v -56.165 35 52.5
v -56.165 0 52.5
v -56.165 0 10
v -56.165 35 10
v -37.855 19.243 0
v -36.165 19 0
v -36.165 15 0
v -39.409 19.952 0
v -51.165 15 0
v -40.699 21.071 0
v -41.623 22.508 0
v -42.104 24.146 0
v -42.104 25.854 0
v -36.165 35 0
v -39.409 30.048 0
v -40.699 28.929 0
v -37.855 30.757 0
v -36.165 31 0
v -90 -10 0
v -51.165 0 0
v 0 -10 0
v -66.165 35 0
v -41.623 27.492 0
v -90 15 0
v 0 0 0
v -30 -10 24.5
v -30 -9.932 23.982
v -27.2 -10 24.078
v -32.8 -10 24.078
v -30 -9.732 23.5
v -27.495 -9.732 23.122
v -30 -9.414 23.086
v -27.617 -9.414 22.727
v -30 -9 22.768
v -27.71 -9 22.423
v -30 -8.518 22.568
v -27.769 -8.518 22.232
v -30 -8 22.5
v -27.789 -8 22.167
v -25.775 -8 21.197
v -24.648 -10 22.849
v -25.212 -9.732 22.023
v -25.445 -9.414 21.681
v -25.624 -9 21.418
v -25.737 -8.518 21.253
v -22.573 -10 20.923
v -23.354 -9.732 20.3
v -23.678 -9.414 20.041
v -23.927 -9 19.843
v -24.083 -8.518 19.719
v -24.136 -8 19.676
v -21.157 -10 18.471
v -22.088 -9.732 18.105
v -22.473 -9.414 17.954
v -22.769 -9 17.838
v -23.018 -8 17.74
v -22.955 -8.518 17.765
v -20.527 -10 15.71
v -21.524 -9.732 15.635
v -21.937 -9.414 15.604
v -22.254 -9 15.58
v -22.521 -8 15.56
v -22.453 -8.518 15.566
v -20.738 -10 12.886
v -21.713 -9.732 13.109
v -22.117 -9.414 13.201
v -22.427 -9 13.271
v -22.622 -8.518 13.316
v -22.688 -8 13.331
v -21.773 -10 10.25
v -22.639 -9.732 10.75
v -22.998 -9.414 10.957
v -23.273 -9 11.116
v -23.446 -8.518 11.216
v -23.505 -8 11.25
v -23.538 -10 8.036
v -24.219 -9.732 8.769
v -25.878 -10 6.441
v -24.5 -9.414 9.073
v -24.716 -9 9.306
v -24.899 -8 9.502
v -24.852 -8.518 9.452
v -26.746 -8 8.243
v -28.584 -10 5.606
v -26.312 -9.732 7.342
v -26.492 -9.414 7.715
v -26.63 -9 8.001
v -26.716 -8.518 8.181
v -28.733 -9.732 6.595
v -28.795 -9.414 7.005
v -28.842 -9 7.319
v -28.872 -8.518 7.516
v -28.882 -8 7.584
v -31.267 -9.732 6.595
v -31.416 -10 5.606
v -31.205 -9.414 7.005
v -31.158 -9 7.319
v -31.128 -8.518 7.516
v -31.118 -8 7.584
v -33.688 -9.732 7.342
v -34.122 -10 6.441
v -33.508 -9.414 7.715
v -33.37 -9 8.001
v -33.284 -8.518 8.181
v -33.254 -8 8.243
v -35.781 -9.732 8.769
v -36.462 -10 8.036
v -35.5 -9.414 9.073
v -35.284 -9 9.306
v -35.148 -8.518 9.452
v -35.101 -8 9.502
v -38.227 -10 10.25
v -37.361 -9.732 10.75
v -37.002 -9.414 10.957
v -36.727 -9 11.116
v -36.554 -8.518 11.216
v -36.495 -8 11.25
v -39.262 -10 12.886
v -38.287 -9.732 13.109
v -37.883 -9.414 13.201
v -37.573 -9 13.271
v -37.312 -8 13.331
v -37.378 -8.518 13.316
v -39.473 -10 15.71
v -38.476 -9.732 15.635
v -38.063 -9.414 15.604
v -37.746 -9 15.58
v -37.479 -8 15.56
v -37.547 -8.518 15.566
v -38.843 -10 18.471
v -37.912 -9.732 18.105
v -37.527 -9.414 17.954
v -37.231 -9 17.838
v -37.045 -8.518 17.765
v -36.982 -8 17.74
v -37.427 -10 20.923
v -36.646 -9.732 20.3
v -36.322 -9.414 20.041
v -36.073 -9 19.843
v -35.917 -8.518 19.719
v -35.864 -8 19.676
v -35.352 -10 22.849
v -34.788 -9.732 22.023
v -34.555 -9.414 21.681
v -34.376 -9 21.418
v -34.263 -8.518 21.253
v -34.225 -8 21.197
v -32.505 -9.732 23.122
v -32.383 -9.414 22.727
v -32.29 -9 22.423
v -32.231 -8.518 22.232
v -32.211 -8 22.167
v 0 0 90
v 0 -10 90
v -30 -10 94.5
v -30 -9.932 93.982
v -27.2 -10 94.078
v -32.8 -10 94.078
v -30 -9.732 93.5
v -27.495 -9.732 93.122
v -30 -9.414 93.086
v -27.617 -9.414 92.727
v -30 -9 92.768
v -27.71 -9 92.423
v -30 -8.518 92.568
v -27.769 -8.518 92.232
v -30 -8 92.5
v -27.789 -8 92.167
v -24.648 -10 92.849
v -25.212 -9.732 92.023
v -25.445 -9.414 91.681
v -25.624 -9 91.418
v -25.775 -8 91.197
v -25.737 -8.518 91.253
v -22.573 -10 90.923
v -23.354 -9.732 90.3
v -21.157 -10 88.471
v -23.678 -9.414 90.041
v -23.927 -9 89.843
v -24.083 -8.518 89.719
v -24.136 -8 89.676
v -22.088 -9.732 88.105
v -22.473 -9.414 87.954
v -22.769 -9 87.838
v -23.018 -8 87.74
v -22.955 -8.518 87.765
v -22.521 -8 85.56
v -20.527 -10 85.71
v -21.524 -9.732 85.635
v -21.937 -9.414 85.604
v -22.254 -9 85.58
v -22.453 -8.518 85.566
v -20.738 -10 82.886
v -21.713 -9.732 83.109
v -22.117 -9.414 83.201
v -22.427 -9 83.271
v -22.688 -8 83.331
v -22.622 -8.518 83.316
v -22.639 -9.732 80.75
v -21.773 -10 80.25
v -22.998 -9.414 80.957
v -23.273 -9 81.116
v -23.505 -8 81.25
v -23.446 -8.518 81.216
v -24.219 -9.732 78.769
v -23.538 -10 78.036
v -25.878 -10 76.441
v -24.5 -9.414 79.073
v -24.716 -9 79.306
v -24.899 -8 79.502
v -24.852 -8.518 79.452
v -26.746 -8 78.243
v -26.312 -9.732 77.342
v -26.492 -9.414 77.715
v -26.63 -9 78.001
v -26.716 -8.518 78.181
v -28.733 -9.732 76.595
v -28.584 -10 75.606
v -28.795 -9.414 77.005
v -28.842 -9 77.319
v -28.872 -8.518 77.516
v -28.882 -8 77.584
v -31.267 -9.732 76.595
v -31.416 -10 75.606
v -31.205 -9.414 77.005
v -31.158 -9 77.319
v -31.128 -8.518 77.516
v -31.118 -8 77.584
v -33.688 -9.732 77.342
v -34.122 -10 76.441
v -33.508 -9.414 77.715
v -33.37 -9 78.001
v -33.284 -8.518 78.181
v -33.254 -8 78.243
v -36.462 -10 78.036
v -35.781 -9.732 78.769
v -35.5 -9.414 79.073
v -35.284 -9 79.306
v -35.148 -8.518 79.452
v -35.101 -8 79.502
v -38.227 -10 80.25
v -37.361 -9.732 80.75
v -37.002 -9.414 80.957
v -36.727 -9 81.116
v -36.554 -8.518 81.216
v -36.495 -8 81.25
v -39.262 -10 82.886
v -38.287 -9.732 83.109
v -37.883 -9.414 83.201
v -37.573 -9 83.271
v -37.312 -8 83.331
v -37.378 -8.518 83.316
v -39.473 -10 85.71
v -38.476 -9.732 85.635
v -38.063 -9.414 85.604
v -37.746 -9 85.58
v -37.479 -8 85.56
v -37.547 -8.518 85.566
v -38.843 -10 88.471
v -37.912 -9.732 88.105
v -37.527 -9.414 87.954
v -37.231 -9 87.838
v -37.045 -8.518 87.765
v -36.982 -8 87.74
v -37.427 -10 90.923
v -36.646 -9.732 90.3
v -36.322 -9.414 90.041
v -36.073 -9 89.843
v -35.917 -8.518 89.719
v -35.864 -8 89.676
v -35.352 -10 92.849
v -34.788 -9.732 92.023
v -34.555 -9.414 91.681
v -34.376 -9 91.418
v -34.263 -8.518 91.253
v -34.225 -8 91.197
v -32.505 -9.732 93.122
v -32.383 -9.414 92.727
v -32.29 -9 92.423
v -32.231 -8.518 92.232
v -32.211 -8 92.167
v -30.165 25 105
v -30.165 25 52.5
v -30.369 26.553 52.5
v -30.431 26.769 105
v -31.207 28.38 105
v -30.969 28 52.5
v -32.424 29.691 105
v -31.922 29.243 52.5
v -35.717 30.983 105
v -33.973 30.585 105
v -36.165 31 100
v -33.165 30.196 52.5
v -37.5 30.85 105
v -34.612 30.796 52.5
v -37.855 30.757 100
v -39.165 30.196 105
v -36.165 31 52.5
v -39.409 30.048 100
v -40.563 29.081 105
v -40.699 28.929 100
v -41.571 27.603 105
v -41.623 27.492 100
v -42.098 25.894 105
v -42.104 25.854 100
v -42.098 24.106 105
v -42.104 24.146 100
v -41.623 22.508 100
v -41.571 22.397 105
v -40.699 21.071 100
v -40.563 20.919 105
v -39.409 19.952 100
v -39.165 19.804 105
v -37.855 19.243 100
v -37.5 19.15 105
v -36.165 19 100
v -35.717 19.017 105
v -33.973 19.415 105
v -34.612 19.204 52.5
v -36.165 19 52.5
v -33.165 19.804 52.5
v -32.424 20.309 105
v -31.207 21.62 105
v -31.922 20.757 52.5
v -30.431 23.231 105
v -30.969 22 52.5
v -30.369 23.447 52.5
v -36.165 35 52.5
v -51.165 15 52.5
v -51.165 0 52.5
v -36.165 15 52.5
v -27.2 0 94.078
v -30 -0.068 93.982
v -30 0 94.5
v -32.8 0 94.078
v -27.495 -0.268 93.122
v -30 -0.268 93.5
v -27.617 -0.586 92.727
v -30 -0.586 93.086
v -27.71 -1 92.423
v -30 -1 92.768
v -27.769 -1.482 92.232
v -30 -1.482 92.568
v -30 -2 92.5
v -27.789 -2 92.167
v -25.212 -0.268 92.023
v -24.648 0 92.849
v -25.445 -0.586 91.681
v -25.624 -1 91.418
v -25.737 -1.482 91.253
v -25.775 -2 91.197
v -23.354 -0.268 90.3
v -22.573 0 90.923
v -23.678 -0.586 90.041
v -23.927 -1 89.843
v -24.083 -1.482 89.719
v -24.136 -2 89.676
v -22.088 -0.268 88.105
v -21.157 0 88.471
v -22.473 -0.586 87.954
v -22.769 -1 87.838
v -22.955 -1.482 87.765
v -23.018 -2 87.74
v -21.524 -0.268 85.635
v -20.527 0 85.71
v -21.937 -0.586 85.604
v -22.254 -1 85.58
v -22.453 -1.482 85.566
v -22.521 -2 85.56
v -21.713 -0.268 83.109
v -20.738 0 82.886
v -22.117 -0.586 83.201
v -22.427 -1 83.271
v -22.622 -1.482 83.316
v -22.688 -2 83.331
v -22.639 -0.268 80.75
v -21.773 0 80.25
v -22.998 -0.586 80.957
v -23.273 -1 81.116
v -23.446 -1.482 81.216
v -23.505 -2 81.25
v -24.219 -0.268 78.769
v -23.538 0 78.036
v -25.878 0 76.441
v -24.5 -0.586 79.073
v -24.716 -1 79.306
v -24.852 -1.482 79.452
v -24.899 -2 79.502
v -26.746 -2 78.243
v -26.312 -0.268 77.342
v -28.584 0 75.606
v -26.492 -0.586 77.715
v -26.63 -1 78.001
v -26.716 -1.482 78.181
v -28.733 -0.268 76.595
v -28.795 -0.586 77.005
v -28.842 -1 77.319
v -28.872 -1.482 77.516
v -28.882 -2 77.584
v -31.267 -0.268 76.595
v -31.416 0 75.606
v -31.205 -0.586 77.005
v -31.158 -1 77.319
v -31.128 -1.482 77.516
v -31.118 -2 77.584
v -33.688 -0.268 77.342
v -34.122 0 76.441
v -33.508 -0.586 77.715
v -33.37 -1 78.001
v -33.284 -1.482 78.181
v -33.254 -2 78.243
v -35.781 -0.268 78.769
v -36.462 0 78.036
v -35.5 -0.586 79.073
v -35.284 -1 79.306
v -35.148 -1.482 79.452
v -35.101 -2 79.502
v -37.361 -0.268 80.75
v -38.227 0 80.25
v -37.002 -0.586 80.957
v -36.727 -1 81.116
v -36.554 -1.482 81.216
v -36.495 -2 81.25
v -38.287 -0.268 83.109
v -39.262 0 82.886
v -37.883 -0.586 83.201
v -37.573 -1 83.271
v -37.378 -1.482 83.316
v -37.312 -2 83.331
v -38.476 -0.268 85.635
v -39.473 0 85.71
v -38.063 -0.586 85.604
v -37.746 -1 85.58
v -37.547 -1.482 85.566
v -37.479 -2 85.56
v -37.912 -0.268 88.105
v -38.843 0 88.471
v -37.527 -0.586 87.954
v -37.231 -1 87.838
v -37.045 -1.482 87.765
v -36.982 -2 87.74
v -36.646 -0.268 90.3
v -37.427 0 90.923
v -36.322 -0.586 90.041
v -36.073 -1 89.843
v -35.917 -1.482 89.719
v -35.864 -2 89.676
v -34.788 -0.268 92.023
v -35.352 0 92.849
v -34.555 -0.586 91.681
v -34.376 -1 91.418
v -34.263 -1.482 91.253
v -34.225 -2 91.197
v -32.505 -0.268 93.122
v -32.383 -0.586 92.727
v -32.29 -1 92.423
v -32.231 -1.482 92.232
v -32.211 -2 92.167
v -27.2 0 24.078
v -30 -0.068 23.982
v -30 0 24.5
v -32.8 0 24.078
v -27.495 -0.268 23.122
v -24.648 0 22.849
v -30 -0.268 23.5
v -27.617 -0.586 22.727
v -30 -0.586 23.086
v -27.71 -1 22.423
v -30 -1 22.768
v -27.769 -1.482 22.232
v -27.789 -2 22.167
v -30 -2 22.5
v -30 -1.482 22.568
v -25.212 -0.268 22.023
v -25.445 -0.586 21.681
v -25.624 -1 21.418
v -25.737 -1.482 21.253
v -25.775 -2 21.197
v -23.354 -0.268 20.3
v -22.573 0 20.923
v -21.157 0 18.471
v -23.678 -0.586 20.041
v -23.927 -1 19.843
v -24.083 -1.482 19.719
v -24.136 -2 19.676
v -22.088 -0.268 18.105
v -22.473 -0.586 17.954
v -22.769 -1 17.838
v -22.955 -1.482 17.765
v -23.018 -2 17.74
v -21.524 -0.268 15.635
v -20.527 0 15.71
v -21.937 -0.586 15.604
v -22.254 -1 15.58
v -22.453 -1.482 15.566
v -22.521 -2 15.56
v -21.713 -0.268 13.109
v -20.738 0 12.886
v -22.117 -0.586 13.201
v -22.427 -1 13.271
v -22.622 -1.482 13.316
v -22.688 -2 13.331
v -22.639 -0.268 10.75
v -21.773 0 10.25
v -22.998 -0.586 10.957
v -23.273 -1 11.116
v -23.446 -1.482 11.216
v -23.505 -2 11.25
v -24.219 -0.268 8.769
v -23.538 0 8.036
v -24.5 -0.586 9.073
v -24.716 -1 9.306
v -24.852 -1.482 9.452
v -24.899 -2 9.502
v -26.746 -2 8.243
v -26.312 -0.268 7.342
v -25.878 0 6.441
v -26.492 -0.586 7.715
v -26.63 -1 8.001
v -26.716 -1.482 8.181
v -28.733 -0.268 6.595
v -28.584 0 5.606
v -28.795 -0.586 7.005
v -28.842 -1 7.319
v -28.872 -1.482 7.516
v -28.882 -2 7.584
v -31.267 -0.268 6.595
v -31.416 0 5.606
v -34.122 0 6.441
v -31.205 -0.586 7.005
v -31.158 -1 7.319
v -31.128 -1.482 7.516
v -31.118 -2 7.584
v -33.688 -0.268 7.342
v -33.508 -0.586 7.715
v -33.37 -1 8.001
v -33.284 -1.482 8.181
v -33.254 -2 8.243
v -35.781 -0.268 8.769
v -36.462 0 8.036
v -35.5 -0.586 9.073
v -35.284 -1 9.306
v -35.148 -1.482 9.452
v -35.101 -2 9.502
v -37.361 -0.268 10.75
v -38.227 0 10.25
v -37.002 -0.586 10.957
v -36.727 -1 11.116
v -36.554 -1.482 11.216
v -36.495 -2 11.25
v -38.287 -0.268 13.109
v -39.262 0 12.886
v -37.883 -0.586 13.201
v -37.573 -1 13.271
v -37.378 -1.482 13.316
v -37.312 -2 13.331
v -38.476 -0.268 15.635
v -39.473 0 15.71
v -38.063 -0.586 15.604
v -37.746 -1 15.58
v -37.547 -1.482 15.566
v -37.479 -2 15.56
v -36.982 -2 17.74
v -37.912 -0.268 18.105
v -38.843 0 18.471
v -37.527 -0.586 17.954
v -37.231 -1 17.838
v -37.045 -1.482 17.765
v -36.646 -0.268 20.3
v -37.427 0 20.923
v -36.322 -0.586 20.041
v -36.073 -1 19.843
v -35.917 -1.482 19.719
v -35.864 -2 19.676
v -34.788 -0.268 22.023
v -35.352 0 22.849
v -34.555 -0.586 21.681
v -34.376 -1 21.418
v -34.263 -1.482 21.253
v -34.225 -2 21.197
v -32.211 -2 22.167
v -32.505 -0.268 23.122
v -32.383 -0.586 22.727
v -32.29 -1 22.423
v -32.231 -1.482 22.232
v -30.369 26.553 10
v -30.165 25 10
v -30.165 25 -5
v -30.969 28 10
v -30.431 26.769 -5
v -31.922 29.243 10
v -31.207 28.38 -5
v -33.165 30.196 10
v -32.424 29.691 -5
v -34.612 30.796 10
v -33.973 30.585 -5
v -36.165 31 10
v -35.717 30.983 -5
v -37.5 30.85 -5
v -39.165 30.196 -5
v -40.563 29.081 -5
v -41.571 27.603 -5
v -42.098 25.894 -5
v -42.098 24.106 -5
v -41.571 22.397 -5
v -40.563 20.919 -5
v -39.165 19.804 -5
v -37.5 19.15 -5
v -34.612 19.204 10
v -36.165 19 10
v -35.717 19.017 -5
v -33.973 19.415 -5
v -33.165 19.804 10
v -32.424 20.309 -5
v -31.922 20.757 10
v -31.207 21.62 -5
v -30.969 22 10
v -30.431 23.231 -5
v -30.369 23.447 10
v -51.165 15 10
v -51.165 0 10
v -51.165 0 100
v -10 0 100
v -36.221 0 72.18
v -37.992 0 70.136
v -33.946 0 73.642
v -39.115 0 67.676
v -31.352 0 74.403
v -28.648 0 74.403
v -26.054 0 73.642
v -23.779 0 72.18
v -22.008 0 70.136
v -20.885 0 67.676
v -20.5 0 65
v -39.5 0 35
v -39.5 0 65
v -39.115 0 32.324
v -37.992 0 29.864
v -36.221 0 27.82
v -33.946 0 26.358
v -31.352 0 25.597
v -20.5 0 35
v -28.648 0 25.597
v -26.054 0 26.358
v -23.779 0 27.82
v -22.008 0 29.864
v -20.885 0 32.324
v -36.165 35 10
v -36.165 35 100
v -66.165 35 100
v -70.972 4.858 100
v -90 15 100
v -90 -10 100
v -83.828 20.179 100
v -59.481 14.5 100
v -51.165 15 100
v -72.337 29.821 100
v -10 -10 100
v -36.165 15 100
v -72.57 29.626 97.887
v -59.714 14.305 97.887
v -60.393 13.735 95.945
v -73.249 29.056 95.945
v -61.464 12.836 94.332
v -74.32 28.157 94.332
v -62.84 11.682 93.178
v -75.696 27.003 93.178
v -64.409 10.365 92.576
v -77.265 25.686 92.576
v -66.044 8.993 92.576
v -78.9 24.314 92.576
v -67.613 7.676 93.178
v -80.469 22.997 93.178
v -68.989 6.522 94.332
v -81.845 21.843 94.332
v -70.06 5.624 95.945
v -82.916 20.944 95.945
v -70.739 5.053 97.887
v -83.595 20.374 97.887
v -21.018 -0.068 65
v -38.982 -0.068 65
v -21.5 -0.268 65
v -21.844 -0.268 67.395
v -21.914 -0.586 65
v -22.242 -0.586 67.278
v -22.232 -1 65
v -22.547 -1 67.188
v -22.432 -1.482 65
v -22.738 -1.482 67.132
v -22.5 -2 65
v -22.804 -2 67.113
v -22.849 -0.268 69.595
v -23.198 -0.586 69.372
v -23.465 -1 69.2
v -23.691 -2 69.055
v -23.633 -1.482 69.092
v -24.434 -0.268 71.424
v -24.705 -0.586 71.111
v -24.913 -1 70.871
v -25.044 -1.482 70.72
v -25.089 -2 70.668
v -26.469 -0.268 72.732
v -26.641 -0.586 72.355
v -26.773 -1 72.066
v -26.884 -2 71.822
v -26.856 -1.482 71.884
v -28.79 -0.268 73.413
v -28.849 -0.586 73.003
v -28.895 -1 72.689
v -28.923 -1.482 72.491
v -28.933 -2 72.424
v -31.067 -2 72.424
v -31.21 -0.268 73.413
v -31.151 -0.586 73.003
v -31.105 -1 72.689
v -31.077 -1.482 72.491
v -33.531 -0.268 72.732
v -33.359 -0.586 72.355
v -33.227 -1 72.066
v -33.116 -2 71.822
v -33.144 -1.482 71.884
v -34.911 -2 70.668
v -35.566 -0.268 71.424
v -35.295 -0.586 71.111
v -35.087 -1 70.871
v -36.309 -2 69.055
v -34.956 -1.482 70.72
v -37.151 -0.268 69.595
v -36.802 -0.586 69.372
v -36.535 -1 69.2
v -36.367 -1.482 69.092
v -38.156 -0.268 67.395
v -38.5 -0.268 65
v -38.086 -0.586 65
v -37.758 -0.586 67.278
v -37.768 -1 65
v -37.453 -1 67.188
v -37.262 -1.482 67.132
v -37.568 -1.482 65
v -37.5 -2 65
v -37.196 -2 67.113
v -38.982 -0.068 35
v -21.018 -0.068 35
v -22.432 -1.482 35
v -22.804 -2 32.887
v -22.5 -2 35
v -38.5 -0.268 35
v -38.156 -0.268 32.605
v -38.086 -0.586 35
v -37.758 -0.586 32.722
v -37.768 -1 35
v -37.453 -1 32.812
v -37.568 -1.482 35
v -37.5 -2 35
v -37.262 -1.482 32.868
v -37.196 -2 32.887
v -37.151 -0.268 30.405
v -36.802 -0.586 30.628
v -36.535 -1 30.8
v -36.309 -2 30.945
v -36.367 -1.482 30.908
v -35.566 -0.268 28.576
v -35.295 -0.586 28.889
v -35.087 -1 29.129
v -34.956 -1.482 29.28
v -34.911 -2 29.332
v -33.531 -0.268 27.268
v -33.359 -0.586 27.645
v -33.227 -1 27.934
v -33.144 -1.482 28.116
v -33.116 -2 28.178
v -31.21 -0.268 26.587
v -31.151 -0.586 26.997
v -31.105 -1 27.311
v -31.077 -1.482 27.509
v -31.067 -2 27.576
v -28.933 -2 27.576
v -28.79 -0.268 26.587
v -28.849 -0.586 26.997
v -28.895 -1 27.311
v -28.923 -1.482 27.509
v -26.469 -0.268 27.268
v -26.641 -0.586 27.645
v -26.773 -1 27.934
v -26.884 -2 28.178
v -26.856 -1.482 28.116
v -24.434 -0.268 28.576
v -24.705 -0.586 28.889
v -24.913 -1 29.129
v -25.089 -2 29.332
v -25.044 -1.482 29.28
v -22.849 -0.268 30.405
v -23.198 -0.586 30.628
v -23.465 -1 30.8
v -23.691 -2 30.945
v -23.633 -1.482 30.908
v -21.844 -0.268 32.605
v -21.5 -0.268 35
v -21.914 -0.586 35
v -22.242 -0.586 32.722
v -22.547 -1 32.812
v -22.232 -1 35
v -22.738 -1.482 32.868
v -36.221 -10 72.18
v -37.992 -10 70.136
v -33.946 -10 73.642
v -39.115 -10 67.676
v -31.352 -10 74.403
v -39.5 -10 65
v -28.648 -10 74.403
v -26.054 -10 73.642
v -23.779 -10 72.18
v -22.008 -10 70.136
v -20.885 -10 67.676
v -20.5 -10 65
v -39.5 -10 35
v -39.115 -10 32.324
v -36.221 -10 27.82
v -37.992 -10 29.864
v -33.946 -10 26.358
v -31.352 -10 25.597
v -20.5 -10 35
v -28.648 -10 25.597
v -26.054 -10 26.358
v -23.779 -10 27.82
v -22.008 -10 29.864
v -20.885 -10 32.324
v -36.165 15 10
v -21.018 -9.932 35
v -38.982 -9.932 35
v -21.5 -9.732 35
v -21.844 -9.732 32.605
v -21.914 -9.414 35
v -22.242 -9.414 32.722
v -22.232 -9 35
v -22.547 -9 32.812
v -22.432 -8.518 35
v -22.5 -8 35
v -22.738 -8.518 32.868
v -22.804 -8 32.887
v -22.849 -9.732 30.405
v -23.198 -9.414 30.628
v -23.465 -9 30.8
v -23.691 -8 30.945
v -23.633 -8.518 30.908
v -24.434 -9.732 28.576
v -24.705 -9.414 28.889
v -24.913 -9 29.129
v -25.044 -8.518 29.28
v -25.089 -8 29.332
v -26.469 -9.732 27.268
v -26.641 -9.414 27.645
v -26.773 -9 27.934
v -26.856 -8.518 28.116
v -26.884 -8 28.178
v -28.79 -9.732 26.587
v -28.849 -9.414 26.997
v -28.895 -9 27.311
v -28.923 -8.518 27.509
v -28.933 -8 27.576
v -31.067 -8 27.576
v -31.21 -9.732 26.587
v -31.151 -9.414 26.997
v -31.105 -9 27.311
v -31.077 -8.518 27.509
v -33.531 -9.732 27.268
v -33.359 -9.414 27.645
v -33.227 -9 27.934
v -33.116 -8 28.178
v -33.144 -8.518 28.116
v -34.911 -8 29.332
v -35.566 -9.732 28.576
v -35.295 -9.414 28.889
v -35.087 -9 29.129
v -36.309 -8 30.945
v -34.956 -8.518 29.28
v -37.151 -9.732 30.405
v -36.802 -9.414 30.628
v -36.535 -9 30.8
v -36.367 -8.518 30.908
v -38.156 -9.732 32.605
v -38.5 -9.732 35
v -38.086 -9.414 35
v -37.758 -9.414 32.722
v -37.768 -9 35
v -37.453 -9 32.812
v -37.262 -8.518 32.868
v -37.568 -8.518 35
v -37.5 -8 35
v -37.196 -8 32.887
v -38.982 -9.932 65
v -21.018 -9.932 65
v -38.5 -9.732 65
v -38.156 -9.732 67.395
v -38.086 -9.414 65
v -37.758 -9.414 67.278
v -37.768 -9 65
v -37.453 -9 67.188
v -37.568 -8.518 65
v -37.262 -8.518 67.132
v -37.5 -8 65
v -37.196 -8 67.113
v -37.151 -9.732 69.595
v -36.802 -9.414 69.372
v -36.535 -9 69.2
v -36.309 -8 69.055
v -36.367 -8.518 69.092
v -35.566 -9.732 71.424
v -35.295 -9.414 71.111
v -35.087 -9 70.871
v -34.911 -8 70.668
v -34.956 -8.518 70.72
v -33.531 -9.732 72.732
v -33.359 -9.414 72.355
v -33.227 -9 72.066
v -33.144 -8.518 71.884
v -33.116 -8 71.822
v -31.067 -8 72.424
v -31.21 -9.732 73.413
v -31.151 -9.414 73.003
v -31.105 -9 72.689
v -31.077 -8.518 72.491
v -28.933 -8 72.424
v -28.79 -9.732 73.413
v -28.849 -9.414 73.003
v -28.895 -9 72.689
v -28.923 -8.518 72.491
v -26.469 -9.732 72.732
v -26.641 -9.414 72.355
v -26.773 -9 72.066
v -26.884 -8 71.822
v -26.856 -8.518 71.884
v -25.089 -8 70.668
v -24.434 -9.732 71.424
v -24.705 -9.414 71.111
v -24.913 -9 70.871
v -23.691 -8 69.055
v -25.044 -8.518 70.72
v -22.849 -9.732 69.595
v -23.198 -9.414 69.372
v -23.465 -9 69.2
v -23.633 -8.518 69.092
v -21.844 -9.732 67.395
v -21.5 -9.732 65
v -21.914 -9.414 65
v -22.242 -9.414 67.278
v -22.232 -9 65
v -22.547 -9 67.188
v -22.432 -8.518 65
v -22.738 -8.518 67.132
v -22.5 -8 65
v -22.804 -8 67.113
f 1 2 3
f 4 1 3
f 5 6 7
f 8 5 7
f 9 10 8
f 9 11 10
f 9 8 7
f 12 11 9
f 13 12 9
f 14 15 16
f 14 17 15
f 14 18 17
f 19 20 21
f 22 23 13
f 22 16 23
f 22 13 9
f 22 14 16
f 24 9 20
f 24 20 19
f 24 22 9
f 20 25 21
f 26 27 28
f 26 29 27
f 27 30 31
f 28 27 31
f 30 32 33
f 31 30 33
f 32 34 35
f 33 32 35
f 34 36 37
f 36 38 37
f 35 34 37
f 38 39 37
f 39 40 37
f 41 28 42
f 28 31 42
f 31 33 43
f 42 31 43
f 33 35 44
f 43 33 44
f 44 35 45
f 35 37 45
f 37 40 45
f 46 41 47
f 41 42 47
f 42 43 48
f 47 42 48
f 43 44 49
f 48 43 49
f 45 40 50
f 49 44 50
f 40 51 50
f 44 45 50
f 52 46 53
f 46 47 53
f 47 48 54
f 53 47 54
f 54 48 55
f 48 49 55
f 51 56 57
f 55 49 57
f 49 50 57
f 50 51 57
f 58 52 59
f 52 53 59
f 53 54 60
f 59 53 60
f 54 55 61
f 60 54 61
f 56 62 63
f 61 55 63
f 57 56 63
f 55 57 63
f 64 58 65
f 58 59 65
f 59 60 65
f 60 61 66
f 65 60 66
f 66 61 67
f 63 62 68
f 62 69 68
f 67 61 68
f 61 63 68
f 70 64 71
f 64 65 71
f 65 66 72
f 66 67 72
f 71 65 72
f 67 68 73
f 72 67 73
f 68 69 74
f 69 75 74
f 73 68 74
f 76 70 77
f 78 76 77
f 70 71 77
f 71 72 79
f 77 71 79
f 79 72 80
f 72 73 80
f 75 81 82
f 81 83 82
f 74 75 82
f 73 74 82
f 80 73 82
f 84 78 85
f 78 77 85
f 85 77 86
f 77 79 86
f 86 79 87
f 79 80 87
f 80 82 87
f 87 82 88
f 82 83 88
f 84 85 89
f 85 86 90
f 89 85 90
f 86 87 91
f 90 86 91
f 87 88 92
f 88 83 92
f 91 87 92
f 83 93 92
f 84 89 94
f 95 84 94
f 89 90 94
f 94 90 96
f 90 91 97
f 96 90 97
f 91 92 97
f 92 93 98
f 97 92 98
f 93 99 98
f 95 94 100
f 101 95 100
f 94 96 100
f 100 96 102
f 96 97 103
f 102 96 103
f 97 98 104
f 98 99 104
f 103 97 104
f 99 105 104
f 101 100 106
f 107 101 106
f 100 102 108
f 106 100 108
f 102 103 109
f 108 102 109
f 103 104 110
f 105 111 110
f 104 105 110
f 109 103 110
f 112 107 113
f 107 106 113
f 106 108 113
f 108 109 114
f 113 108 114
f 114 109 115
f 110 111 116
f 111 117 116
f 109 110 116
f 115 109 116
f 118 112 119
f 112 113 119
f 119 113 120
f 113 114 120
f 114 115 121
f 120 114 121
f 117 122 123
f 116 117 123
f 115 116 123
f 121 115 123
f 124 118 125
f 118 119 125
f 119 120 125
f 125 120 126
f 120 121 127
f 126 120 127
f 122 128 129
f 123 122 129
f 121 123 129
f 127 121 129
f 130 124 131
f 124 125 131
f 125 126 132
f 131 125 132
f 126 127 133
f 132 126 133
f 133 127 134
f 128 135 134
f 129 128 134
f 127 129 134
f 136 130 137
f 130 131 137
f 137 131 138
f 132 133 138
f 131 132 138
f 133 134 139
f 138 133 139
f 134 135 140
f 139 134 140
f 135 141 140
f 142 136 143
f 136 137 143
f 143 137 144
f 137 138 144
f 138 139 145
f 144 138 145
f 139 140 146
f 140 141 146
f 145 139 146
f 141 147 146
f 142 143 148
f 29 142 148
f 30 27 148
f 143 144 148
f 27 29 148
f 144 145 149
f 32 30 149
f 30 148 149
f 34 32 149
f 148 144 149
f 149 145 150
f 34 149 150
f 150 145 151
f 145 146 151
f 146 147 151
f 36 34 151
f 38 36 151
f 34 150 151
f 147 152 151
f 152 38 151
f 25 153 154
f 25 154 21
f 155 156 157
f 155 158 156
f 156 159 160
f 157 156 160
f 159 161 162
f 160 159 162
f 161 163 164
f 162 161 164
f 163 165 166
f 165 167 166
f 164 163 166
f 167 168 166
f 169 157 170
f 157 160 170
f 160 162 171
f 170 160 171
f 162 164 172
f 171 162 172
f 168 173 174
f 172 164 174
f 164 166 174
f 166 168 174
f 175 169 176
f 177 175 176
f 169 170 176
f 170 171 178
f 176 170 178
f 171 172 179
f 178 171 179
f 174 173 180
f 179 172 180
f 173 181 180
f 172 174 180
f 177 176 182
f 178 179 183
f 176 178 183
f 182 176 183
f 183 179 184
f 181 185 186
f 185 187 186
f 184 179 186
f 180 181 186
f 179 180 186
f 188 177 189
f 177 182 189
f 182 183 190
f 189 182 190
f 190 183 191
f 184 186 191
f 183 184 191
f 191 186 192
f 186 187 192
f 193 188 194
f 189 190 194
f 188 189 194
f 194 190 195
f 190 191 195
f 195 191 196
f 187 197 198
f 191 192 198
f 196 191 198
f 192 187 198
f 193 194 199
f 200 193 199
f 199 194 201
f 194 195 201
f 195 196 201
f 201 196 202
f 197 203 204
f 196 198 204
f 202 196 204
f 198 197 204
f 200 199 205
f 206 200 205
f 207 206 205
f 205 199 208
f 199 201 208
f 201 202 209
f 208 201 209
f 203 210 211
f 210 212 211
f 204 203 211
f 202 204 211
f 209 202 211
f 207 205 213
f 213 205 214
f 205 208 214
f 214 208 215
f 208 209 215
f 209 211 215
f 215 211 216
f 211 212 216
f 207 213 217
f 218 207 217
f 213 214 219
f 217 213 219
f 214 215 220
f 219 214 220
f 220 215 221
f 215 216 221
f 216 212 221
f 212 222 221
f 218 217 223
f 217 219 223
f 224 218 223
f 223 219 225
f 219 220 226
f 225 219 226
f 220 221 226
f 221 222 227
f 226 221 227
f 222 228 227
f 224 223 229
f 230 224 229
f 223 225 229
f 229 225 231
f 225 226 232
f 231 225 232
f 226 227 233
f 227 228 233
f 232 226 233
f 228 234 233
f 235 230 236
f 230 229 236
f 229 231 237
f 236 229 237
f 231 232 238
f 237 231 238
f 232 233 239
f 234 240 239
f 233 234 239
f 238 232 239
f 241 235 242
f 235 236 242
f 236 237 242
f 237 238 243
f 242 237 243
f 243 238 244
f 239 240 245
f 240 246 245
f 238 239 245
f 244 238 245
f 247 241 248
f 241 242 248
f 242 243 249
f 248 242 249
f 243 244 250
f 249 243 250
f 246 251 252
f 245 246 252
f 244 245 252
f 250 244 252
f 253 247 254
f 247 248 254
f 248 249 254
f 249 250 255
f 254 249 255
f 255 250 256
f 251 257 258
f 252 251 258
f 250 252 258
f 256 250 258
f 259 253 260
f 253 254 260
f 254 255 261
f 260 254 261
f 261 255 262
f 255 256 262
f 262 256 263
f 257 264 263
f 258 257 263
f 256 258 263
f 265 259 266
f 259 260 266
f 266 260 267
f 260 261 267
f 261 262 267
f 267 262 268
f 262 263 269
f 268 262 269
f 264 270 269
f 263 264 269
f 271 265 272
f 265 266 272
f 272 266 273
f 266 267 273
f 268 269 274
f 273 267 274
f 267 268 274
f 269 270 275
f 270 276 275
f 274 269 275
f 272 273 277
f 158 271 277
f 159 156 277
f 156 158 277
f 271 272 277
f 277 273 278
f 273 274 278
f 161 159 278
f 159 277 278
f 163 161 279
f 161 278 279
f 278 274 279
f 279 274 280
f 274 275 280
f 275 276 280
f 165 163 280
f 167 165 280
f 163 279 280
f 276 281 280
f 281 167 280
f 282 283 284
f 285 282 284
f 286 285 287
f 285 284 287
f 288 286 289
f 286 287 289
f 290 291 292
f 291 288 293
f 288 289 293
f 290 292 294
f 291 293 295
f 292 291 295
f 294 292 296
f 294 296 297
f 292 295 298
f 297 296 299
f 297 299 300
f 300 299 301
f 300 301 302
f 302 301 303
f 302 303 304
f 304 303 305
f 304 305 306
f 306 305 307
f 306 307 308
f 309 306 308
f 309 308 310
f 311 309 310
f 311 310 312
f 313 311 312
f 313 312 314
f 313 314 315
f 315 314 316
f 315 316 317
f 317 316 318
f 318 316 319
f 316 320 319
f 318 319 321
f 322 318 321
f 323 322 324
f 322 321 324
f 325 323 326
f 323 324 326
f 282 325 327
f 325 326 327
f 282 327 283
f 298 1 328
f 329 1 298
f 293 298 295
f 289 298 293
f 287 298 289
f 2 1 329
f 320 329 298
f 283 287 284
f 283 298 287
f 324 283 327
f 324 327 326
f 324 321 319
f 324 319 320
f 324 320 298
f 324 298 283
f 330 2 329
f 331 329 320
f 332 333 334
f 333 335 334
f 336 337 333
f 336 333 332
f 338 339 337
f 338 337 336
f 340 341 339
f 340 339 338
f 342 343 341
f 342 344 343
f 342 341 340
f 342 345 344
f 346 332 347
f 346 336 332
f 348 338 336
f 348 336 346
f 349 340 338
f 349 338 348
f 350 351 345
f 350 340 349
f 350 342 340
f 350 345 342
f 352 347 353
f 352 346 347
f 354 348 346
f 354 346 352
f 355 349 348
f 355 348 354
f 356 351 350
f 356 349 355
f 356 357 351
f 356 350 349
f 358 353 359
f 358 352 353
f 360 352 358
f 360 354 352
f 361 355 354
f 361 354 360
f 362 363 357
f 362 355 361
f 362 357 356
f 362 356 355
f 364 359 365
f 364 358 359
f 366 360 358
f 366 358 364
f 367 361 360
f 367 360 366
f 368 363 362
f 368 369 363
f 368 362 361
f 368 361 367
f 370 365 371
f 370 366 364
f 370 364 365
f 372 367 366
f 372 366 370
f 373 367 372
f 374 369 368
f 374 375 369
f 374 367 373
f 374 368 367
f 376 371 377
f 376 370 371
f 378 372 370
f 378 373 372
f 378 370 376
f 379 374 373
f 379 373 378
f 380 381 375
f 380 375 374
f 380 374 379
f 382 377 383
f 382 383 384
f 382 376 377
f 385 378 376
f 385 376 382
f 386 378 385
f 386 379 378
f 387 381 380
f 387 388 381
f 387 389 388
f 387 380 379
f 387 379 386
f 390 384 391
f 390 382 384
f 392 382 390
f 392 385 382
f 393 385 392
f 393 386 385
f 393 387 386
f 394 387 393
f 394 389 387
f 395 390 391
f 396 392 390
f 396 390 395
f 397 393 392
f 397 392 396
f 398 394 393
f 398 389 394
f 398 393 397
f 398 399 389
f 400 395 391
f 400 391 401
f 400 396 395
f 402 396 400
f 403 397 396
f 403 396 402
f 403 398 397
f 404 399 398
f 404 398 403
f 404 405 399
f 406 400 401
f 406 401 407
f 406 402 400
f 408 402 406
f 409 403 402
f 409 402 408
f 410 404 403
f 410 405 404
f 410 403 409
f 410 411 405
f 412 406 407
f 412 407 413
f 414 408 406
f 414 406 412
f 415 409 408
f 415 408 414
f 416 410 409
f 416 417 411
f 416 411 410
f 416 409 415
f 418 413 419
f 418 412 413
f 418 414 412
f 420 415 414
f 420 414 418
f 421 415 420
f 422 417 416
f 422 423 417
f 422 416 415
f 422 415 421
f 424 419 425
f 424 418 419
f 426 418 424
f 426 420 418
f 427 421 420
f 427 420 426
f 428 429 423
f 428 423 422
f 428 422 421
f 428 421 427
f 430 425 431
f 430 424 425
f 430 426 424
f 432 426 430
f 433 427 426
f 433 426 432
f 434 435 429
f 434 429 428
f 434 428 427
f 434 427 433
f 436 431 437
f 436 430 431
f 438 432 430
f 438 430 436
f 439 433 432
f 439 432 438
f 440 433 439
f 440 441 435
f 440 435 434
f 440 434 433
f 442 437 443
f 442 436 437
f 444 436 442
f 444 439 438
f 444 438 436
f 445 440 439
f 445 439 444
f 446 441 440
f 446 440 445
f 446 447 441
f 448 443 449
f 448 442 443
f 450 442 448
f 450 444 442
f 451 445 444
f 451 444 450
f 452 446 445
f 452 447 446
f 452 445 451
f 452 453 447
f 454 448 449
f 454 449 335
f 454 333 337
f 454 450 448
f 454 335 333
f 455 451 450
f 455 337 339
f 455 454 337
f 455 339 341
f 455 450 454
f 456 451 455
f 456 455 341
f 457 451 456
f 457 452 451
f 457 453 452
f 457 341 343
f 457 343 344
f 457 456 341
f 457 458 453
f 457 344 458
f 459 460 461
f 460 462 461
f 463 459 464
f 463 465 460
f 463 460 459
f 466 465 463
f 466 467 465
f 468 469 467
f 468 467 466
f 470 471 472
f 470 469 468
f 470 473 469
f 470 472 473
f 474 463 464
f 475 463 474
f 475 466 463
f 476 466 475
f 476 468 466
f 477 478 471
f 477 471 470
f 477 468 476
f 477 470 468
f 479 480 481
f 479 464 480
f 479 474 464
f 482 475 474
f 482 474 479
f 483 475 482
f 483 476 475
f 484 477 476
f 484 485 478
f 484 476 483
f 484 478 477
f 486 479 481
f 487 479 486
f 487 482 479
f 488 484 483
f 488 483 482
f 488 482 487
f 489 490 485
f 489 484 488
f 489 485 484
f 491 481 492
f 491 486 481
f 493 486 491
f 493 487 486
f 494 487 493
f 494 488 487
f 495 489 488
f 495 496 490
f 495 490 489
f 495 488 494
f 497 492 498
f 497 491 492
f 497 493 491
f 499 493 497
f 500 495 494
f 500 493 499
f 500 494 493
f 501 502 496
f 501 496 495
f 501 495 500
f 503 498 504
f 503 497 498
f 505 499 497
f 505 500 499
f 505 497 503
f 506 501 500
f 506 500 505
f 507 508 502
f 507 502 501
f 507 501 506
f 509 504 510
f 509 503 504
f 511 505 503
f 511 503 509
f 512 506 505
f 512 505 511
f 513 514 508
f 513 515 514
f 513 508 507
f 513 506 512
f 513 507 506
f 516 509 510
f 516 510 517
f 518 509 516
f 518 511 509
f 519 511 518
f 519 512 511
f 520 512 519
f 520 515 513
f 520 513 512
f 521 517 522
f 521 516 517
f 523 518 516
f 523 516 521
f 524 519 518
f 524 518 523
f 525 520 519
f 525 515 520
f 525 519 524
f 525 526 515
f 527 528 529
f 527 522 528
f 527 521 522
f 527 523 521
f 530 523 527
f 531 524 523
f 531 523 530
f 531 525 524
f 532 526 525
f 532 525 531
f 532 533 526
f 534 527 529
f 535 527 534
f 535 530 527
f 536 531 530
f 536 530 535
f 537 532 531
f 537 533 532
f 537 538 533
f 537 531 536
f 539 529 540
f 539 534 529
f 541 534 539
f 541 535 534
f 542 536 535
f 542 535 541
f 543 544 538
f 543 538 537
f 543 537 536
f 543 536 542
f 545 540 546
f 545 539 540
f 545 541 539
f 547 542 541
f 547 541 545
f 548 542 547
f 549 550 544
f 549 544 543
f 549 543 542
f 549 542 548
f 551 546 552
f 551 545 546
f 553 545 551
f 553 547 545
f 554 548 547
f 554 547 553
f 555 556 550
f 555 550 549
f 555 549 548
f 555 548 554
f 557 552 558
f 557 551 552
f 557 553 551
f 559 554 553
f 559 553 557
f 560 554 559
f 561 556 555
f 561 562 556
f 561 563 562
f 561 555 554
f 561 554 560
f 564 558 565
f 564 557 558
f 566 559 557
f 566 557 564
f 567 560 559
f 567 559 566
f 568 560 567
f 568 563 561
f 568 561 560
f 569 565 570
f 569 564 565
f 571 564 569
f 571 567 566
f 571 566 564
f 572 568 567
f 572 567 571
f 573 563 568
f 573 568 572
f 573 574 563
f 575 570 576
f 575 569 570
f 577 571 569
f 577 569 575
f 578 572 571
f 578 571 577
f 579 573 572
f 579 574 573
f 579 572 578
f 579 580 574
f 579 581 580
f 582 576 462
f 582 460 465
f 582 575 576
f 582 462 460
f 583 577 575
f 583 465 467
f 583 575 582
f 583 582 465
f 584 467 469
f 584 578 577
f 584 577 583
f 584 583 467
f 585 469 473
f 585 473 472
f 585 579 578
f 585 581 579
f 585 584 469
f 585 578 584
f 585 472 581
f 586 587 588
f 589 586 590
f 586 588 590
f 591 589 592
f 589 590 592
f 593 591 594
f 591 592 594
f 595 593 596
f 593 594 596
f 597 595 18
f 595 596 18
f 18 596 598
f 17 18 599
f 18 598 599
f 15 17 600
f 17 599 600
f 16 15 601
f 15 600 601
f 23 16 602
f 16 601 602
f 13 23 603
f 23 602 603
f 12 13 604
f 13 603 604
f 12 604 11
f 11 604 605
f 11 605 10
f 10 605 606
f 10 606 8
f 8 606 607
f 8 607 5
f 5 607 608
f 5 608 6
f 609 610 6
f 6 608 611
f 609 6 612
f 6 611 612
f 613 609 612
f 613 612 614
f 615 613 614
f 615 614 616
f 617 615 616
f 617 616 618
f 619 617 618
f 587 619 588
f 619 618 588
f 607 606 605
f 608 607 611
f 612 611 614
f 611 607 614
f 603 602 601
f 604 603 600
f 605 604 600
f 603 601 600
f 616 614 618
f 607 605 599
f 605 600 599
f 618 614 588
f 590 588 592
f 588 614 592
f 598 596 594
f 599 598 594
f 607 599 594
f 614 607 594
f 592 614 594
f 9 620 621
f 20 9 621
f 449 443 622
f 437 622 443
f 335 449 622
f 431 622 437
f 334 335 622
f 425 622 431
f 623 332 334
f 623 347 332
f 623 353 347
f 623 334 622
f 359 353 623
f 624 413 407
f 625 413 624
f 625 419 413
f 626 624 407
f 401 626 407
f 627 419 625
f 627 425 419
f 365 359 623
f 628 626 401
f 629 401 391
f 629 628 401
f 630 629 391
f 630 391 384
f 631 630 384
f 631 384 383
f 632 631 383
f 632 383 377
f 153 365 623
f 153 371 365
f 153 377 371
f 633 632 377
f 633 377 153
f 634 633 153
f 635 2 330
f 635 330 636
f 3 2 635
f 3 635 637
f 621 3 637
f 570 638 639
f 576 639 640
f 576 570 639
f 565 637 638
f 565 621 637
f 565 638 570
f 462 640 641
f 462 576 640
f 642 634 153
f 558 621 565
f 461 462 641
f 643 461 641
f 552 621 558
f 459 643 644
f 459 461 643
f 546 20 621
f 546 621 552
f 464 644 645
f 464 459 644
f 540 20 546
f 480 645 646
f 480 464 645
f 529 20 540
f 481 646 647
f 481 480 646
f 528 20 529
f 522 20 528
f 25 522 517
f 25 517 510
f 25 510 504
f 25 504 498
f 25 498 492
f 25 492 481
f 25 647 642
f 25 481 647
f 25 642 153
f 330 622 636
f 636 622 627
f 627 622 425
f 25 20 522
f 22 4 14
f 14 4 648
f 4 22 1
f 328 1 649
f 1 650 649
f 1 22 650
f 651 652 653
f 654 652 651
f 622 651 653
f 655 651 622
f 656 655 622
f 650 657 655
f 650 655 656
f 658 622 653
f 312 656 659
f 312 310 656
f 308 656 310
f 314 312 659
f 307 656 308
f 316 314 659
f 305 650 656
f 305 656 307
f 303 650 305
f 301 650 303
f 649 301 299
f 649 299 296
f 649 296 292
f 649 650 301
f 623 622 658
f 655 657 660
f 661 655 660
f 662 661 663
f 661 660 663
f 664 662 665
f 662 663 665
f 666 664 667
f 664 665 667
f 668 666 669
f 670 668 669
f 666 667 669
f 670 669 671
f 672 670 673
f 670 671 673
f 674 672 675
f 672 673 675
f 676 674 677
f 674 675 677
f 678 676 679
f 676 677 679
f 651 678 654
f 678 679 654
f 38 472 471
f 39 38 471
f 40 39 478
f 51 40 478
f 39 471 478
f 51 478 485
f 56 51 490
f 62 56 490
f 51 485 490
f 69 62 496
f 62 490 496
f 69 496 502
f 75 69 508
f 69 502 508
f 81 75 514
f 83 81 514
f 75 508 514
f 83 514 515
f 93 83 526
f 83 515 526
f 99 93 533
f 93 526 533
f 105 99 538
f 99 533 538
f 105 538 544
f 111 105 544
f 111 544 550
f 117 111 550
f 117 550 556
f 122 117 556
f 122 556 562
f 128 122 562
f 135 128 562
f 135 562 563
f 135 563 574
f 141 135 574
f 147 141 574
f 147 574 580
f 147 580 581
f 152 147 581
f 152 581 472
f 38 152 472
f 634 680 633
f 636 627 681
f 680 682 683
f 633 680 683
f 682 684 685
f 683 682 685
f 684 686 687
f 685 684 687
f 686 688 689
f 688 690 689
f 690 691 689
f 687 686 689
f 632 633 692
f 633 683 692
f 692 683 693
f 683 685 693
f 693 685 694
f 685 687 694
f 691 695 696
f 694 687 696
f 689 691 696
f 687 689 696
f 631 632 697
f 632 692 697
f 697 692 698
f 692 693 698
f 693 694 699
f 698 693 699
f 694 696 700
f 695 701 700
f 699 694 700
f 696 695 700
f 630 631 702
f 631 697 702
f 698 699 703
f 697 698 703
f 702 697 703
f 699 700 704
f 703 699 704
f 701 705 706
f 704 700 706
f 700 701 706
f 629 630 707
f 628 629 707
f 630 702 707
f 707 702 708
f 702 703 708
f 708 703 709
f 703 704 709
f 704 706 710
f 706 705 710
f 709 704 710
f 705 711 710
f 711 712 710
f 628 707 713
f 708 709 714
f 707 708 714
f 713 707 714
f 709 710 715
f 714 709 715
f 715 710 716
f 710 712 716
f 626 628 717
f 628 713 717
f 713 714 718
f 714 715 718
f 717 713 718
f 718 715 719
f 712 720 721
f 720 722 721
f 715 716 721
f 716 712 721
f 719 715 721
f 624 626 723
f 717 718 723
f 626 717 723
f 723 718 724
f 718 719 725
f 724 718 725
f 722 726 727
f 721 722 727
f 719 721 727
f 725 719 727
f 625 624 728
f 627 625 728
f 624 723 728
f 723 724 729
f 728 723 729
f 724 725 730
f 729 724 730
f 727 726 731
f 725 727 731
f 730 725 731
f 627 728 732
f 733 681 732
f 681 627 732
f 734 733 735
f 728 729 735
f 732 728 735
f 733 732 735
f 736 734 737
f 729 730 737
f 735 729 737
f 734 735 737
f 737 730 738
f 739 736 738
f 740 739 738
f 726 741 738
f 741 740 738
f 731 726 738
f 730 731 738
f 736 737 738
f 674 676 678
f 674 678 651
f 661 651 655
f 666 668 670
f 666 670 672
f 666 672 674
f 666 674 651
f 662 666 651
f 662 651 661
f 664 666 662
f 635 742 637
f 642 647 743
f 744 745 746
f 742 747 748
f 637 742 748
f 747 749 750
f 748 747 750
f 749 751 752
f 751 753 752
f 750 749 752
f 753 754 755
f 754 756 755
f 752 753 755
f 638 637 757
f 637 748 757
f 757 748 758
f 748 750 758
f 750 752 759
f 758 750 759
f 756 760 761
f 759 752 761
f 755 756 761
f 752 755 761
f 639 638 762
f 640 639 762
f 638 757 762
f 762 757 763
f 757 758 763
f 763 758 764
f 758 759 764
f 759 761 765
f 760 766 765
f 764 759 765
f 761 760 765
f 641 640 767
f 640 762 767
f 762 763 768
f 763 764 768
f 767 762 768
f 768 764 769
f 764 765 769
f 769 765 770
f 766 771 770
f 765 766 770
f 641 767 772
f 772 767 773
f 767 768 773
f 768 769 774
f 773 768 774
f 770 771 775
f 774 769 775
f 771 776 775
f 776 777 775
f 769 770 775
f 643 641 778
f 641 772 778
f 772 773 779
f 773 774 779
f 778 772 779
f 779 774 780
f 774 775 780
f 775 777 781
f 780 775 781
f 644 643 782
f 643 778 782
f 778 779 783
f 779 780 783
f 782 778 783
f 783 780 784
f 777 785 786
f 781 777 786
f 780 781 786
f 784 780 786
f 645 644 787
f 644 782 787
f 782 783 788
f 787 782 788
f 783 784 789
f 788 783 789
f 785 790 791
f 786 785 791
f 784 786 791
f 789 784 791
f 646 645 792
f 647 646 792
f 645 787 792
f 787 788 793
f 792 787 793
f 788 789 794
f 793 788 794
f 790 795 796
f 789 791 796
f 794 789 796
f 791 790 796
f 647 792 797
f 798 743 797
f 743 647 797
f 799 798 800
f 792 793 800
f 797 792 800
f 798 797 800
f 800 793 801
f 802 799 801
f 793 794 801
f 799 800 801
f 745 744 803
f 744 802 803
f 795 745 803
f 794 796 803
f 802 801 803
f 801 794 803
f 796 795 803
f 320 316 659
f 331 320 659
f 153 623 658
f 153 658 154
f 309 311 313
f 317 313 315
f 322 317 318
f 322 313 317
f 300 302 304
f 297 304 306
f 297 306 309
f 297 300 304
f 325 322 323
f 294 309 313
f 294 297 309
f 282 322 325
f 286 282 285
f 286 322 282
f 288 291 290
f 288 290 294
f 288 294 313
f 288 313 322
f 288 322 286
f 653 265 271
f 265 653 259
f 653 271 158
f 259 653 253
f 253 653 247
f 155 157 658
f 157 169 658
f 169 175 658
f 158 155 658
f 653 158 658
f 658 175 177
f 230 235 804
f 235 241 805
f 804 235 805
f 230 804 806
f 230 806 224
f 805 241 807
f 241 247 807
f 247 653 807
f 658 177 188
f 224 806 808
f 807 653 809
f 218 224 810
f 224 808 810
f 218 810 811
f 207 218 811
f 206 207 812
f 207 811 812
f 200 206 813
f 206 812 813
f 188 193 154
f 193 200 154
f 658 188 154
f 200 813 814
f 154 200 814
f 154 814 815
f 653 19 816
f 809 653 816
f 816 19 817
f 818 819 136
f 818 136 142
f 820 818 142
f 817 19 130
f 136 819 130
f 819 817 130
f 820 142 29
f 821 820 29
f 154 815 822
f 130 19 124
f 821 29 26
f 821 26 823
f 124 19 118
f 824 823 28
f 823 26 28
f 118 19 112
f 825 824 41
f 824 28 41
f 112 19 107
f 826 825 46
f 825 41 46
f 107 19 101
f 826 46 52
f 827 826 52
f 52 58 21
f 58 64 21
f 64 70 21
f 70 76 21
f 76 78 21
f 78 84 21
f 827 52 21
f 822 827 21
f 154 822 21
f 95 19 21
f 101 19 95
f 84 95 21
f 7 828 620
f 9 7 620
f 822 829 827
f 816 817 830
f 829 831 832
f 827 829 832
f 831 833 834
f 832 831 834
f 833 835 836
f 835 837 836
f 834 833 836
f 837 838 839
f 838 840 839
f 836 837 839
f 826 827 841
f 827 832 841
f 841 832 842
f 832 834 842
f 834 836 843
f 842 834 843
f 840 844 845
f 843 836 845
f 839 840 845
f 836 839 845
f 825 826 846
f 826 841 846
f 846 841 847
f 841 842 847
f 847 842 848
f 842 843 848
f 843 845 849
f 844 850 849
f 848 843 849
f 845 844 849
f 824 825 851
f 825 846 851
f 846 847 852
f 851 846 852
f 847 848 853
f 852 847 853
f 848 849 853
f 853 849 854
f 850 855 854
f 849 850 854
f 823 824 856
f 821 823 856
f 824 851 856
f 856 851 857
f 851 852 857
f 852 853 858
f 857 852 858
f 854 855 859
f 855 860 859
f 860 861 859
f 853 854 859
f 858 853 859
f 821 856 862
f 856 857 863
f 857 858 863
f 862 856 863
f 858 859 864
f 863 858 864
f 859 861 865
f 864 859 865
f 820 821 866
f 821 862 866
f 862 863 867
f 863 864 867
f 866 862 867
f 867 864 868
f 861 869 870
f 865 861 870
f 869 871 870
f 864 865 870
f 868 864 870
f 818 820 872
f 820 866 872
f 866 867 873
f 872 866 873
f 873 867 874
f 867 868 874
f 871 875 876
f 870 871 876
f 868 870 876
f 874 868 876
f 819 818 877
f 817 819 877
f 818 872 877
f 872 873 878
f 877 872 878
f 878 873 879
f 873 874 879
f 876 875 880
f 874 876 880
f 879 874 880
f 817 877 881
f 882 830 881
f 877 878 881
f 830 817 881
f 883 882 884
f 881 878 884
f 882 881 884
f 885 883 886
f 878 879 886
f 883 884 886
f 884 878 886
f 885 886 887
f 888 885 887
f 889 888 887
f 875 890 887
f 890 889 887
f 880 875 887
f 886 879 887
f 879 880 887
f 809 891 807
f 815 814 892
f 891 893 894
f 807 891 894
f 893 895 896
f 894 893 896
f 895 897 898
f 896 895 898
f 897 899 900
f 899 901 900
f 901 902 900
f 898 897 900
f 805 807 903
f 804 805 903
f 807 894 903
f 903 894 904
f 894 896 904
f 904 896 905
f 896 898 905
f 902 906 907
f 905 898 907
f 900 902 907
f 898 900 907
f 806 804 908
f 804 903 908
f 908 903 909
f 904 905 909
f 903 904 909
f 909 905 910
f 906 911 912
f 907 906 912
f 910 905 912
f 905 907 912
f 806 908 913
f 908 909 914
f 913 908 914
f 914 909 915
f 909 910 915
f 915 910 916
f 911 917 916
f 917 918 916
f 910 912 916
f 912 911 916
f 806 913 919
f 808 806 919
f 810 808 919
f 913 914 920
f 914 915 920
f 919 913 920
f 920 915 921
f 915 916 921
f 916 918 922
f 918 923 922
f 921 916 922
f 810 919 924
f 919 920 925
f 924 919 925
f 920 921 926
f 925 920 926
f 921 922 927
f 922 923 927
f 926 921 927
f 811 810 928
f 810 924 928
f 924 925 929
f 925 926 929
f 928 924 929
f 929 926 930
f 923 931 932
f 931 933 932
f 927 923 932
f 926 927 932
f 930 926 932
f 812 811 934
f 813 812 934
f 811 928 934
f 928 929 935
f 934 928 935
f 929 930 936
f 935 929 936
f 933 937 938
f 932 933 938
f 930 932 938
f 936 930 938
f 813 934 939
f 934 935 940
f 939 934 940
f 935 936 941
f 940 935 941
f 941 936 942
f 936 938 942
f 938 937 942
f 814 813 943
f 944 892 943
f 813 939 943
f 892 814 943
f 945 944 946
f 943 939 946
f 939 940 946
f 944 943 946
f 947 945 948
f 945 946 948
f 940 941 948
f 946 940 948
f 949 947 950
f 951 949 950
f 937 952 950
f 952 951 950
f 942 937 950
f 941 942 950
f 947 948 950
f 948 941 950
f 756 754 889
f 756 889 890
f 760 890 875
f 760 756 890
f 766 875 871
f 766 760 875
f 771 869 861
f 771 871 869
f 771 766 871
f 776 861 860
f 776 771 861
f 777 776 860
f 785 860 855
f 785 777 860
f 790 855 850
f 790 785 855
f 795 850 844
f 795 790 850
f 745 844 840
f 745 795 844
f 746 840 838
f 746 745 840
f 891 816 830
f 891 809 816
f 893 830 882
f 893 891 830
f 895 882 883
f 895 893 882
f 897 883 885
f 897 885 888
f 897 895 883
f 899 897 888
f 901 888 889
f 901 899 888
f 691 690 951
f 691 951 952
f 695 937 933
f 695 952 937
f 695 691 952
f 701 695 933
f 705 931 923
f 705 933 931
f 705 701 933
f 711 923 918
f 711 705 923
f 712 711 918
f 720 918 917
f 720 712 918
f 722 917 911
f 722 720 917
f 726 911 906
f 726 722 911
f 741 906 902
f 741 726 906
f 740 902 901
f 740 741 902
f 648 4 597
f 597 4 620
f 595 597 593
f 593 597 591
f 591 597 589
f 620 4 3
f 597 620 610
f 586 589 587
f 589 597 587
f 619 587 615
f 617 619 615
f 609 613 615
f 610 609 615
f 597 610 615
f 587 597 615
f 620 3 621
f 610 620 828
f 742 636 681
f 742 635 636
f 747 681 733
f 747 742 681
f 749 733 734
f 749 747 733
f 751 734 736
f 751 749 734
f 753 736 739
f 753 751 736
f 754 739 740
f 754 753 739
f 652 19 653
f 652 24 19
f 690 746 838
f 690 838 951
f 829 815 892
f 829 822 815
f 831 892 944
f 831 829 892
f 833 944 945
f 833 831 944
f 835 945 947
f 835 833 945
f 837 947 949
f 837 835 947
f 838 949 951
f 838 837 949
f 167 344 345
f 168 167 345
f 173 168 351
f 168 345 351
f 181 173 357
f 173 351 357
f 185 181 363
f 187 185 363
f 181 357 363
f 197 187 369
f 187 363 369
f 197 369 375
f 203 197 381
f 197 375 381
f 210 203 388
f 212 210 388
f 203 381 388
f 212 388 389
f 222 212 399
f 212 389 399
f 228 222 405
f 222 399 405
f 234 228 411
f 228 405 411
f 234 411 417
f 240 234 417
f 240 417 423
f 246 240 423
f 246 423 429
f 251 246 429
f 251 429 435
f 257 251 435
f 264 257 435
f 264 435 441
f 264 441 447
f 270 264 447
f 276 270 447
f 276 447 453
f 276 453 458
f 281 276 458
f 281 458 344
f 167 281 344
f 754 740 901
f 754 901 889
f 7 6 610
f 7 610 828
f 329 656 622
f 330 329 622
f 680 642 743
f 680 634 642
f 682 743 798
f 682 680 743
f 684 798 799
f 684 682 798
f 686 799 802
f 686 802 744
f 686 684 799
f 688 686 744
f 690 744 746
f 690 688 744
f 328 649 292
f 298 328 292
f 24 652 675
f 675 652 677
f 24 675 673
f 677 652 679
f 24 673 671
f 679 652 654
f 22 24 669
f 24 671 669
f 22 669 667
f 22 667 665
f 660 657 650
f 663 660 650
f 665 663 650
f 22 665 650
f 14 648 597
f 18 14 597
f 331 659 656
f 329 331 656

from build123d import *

# Parameters (mm, degrees)
BOSS_EXTRUDE1_DEPTH      = 10
SKETCH2_R                = 7.5
CUT_EXTRUDE1_DEPTH       = 135.907375632
FILLET1_R                = 2
BOSS_EXTRUDE2_DEPTH      = 100
BOSS_EXTRUDE3_DEPTH      = 5
BOSS_EXTRUDE3_DEPTH_BACK = 105
SKETCH4_R                = 6
CUT_EXTRUDE2_DEPTH       = 146.430395722
CUT_EXTRUDE2_DEPTH_BACK  = 35
SKETCH5_W                = 26
SKETCH5_H                = 42.5
SKETCH6_R                = 7.5
CUT_EXTRUDE3_DEPTH       = 20


with BuildPart() as part:
    # Sketch1 → Boss-Extrude1 (new body)
    with BuildSketch(Plane(origin=(0, 0, 0), x_dir=(1, 0, 0), z_dir=(0, 1, 0))):
        Polygon((-90, -100), (-10, -100), (0, -90), (0, 0), (-90, 0), align=None)
    extrude(amount=-BOSS_EXTRUDE1_DEPTH)

    # Sketch2 → Cut-Extrude1 (cut, through all)
    with BuildSketch(Plane(origin=(0, 0, 0), x_dir=(1, 0, 0), z_dir=(0, 1, 0))):
        with Locations(Location((-30, -15, 0), (0, 0, 270))):
            Circle(SKETCH2_R)
        with Locations(Location((-30, -85, 0), (0, 0, 270))):
            Circle(SKETCH2_R)
        with BuildLine():
            Line((-37.5, -65), (-37.5, -35))
            ThreePointArc((-37.5, -35), (-30, -27.5), (-22.5, -35))
            Line((-22.5, -35), (-22.5, -65))
            ThreePointArc((-22.5, -65), (-30, -72.5), (-37.5, -65))
        make_face()
    extrude(amount=-CUT_EXTRUDE1_DEPTH, mode=Mode.SUBTRACT)

    # Fillet1
    fillet1_edges = [part.edges().sort_by_distance(p)[0] for p in [
        (-30, -10, 7.5),
        (-30, 0, 7.5),
        (-30, -10, 77.5),
        (-30, 0, 77.5),
        (-30, -10, 72.5),
        (-37.5, -10, 50),
        (-30, -10, 27.5),
        (-22.5, -10, 50),
        (-30, 0, 72.5),
        (-22.5, 0, 50),
        (-30, 0, 27.5),
        (-37.5, 0, 50),
    ]]
    fillet(fillet1_edges, radius=FILLET1_R)

    # Sketch3 → Boss-Extrude2 (add, through all)
    with BuildSketch(Plane.XY.offset(100)):
        Polygon((-90, -10), (-90, 15), (-66.164928148, 35), (-36.164928148, 35), (-36.164928148, 15), (-51.164928148, 15), (-51.164928148, -10), align=None)
    extrude(amount=-BOSS_EXTRUDE2_DEPTH)

    # Sketch4 → Boss-Extrude3 (add, two sides: drawn at the far end of the back side and taken through both)
    with BuildSketch(Plane.XY.offset(100).offset(-BOSS_EXTRUDE3_DEPTH_BACK)):
        with Locations((-36.164928148, 25)):
            Circle(SKETCH4_R)
    extrude(amount=BOSS_EXTRUDE3_DEPTH + BOSS_EXTRUDE3_DEPTH_BACK)

    # Sketch5 → Cut-Extrude2 (cut, two sides: drawn at the far end of the back side and taken through both)
    with BuildSketch(Plane(origin=(0, 35, 0), x_dir=(1, 0, 0), z_dir=(0, 1, 0)).offset(-CUT_EXTRUDE2_DEPTH_BACK)):
        with Locations((-43.164928148, -31.25)):
            Rectangle(SKETCH5_W, SKETCH5_H)
    extrude(amount=CUT_EXTRUDE2_DEPTH + CUT_EXTRUDE2_DEPTH_BACK, mode=Mode.SUBTRACT)

    # Sketch6 → Cut-Extrude3 (cut)
    with BuildSketch(Plane(origin=(-44.571890153, 53.118710218, 0), x_dir=(0.7660444431189795, 0.6427876096865378, 0), z_dir=(-0.6427876096865378, 0.7660444431189795, 0))):
        with Locations((-43.744947467, -100)):
            Circle(SKETCH6_R)
    extrude(amount=-CUT_EXTRUDE3_DEPTH, mode=Mode.SUBTRACT)


solid = part.part
